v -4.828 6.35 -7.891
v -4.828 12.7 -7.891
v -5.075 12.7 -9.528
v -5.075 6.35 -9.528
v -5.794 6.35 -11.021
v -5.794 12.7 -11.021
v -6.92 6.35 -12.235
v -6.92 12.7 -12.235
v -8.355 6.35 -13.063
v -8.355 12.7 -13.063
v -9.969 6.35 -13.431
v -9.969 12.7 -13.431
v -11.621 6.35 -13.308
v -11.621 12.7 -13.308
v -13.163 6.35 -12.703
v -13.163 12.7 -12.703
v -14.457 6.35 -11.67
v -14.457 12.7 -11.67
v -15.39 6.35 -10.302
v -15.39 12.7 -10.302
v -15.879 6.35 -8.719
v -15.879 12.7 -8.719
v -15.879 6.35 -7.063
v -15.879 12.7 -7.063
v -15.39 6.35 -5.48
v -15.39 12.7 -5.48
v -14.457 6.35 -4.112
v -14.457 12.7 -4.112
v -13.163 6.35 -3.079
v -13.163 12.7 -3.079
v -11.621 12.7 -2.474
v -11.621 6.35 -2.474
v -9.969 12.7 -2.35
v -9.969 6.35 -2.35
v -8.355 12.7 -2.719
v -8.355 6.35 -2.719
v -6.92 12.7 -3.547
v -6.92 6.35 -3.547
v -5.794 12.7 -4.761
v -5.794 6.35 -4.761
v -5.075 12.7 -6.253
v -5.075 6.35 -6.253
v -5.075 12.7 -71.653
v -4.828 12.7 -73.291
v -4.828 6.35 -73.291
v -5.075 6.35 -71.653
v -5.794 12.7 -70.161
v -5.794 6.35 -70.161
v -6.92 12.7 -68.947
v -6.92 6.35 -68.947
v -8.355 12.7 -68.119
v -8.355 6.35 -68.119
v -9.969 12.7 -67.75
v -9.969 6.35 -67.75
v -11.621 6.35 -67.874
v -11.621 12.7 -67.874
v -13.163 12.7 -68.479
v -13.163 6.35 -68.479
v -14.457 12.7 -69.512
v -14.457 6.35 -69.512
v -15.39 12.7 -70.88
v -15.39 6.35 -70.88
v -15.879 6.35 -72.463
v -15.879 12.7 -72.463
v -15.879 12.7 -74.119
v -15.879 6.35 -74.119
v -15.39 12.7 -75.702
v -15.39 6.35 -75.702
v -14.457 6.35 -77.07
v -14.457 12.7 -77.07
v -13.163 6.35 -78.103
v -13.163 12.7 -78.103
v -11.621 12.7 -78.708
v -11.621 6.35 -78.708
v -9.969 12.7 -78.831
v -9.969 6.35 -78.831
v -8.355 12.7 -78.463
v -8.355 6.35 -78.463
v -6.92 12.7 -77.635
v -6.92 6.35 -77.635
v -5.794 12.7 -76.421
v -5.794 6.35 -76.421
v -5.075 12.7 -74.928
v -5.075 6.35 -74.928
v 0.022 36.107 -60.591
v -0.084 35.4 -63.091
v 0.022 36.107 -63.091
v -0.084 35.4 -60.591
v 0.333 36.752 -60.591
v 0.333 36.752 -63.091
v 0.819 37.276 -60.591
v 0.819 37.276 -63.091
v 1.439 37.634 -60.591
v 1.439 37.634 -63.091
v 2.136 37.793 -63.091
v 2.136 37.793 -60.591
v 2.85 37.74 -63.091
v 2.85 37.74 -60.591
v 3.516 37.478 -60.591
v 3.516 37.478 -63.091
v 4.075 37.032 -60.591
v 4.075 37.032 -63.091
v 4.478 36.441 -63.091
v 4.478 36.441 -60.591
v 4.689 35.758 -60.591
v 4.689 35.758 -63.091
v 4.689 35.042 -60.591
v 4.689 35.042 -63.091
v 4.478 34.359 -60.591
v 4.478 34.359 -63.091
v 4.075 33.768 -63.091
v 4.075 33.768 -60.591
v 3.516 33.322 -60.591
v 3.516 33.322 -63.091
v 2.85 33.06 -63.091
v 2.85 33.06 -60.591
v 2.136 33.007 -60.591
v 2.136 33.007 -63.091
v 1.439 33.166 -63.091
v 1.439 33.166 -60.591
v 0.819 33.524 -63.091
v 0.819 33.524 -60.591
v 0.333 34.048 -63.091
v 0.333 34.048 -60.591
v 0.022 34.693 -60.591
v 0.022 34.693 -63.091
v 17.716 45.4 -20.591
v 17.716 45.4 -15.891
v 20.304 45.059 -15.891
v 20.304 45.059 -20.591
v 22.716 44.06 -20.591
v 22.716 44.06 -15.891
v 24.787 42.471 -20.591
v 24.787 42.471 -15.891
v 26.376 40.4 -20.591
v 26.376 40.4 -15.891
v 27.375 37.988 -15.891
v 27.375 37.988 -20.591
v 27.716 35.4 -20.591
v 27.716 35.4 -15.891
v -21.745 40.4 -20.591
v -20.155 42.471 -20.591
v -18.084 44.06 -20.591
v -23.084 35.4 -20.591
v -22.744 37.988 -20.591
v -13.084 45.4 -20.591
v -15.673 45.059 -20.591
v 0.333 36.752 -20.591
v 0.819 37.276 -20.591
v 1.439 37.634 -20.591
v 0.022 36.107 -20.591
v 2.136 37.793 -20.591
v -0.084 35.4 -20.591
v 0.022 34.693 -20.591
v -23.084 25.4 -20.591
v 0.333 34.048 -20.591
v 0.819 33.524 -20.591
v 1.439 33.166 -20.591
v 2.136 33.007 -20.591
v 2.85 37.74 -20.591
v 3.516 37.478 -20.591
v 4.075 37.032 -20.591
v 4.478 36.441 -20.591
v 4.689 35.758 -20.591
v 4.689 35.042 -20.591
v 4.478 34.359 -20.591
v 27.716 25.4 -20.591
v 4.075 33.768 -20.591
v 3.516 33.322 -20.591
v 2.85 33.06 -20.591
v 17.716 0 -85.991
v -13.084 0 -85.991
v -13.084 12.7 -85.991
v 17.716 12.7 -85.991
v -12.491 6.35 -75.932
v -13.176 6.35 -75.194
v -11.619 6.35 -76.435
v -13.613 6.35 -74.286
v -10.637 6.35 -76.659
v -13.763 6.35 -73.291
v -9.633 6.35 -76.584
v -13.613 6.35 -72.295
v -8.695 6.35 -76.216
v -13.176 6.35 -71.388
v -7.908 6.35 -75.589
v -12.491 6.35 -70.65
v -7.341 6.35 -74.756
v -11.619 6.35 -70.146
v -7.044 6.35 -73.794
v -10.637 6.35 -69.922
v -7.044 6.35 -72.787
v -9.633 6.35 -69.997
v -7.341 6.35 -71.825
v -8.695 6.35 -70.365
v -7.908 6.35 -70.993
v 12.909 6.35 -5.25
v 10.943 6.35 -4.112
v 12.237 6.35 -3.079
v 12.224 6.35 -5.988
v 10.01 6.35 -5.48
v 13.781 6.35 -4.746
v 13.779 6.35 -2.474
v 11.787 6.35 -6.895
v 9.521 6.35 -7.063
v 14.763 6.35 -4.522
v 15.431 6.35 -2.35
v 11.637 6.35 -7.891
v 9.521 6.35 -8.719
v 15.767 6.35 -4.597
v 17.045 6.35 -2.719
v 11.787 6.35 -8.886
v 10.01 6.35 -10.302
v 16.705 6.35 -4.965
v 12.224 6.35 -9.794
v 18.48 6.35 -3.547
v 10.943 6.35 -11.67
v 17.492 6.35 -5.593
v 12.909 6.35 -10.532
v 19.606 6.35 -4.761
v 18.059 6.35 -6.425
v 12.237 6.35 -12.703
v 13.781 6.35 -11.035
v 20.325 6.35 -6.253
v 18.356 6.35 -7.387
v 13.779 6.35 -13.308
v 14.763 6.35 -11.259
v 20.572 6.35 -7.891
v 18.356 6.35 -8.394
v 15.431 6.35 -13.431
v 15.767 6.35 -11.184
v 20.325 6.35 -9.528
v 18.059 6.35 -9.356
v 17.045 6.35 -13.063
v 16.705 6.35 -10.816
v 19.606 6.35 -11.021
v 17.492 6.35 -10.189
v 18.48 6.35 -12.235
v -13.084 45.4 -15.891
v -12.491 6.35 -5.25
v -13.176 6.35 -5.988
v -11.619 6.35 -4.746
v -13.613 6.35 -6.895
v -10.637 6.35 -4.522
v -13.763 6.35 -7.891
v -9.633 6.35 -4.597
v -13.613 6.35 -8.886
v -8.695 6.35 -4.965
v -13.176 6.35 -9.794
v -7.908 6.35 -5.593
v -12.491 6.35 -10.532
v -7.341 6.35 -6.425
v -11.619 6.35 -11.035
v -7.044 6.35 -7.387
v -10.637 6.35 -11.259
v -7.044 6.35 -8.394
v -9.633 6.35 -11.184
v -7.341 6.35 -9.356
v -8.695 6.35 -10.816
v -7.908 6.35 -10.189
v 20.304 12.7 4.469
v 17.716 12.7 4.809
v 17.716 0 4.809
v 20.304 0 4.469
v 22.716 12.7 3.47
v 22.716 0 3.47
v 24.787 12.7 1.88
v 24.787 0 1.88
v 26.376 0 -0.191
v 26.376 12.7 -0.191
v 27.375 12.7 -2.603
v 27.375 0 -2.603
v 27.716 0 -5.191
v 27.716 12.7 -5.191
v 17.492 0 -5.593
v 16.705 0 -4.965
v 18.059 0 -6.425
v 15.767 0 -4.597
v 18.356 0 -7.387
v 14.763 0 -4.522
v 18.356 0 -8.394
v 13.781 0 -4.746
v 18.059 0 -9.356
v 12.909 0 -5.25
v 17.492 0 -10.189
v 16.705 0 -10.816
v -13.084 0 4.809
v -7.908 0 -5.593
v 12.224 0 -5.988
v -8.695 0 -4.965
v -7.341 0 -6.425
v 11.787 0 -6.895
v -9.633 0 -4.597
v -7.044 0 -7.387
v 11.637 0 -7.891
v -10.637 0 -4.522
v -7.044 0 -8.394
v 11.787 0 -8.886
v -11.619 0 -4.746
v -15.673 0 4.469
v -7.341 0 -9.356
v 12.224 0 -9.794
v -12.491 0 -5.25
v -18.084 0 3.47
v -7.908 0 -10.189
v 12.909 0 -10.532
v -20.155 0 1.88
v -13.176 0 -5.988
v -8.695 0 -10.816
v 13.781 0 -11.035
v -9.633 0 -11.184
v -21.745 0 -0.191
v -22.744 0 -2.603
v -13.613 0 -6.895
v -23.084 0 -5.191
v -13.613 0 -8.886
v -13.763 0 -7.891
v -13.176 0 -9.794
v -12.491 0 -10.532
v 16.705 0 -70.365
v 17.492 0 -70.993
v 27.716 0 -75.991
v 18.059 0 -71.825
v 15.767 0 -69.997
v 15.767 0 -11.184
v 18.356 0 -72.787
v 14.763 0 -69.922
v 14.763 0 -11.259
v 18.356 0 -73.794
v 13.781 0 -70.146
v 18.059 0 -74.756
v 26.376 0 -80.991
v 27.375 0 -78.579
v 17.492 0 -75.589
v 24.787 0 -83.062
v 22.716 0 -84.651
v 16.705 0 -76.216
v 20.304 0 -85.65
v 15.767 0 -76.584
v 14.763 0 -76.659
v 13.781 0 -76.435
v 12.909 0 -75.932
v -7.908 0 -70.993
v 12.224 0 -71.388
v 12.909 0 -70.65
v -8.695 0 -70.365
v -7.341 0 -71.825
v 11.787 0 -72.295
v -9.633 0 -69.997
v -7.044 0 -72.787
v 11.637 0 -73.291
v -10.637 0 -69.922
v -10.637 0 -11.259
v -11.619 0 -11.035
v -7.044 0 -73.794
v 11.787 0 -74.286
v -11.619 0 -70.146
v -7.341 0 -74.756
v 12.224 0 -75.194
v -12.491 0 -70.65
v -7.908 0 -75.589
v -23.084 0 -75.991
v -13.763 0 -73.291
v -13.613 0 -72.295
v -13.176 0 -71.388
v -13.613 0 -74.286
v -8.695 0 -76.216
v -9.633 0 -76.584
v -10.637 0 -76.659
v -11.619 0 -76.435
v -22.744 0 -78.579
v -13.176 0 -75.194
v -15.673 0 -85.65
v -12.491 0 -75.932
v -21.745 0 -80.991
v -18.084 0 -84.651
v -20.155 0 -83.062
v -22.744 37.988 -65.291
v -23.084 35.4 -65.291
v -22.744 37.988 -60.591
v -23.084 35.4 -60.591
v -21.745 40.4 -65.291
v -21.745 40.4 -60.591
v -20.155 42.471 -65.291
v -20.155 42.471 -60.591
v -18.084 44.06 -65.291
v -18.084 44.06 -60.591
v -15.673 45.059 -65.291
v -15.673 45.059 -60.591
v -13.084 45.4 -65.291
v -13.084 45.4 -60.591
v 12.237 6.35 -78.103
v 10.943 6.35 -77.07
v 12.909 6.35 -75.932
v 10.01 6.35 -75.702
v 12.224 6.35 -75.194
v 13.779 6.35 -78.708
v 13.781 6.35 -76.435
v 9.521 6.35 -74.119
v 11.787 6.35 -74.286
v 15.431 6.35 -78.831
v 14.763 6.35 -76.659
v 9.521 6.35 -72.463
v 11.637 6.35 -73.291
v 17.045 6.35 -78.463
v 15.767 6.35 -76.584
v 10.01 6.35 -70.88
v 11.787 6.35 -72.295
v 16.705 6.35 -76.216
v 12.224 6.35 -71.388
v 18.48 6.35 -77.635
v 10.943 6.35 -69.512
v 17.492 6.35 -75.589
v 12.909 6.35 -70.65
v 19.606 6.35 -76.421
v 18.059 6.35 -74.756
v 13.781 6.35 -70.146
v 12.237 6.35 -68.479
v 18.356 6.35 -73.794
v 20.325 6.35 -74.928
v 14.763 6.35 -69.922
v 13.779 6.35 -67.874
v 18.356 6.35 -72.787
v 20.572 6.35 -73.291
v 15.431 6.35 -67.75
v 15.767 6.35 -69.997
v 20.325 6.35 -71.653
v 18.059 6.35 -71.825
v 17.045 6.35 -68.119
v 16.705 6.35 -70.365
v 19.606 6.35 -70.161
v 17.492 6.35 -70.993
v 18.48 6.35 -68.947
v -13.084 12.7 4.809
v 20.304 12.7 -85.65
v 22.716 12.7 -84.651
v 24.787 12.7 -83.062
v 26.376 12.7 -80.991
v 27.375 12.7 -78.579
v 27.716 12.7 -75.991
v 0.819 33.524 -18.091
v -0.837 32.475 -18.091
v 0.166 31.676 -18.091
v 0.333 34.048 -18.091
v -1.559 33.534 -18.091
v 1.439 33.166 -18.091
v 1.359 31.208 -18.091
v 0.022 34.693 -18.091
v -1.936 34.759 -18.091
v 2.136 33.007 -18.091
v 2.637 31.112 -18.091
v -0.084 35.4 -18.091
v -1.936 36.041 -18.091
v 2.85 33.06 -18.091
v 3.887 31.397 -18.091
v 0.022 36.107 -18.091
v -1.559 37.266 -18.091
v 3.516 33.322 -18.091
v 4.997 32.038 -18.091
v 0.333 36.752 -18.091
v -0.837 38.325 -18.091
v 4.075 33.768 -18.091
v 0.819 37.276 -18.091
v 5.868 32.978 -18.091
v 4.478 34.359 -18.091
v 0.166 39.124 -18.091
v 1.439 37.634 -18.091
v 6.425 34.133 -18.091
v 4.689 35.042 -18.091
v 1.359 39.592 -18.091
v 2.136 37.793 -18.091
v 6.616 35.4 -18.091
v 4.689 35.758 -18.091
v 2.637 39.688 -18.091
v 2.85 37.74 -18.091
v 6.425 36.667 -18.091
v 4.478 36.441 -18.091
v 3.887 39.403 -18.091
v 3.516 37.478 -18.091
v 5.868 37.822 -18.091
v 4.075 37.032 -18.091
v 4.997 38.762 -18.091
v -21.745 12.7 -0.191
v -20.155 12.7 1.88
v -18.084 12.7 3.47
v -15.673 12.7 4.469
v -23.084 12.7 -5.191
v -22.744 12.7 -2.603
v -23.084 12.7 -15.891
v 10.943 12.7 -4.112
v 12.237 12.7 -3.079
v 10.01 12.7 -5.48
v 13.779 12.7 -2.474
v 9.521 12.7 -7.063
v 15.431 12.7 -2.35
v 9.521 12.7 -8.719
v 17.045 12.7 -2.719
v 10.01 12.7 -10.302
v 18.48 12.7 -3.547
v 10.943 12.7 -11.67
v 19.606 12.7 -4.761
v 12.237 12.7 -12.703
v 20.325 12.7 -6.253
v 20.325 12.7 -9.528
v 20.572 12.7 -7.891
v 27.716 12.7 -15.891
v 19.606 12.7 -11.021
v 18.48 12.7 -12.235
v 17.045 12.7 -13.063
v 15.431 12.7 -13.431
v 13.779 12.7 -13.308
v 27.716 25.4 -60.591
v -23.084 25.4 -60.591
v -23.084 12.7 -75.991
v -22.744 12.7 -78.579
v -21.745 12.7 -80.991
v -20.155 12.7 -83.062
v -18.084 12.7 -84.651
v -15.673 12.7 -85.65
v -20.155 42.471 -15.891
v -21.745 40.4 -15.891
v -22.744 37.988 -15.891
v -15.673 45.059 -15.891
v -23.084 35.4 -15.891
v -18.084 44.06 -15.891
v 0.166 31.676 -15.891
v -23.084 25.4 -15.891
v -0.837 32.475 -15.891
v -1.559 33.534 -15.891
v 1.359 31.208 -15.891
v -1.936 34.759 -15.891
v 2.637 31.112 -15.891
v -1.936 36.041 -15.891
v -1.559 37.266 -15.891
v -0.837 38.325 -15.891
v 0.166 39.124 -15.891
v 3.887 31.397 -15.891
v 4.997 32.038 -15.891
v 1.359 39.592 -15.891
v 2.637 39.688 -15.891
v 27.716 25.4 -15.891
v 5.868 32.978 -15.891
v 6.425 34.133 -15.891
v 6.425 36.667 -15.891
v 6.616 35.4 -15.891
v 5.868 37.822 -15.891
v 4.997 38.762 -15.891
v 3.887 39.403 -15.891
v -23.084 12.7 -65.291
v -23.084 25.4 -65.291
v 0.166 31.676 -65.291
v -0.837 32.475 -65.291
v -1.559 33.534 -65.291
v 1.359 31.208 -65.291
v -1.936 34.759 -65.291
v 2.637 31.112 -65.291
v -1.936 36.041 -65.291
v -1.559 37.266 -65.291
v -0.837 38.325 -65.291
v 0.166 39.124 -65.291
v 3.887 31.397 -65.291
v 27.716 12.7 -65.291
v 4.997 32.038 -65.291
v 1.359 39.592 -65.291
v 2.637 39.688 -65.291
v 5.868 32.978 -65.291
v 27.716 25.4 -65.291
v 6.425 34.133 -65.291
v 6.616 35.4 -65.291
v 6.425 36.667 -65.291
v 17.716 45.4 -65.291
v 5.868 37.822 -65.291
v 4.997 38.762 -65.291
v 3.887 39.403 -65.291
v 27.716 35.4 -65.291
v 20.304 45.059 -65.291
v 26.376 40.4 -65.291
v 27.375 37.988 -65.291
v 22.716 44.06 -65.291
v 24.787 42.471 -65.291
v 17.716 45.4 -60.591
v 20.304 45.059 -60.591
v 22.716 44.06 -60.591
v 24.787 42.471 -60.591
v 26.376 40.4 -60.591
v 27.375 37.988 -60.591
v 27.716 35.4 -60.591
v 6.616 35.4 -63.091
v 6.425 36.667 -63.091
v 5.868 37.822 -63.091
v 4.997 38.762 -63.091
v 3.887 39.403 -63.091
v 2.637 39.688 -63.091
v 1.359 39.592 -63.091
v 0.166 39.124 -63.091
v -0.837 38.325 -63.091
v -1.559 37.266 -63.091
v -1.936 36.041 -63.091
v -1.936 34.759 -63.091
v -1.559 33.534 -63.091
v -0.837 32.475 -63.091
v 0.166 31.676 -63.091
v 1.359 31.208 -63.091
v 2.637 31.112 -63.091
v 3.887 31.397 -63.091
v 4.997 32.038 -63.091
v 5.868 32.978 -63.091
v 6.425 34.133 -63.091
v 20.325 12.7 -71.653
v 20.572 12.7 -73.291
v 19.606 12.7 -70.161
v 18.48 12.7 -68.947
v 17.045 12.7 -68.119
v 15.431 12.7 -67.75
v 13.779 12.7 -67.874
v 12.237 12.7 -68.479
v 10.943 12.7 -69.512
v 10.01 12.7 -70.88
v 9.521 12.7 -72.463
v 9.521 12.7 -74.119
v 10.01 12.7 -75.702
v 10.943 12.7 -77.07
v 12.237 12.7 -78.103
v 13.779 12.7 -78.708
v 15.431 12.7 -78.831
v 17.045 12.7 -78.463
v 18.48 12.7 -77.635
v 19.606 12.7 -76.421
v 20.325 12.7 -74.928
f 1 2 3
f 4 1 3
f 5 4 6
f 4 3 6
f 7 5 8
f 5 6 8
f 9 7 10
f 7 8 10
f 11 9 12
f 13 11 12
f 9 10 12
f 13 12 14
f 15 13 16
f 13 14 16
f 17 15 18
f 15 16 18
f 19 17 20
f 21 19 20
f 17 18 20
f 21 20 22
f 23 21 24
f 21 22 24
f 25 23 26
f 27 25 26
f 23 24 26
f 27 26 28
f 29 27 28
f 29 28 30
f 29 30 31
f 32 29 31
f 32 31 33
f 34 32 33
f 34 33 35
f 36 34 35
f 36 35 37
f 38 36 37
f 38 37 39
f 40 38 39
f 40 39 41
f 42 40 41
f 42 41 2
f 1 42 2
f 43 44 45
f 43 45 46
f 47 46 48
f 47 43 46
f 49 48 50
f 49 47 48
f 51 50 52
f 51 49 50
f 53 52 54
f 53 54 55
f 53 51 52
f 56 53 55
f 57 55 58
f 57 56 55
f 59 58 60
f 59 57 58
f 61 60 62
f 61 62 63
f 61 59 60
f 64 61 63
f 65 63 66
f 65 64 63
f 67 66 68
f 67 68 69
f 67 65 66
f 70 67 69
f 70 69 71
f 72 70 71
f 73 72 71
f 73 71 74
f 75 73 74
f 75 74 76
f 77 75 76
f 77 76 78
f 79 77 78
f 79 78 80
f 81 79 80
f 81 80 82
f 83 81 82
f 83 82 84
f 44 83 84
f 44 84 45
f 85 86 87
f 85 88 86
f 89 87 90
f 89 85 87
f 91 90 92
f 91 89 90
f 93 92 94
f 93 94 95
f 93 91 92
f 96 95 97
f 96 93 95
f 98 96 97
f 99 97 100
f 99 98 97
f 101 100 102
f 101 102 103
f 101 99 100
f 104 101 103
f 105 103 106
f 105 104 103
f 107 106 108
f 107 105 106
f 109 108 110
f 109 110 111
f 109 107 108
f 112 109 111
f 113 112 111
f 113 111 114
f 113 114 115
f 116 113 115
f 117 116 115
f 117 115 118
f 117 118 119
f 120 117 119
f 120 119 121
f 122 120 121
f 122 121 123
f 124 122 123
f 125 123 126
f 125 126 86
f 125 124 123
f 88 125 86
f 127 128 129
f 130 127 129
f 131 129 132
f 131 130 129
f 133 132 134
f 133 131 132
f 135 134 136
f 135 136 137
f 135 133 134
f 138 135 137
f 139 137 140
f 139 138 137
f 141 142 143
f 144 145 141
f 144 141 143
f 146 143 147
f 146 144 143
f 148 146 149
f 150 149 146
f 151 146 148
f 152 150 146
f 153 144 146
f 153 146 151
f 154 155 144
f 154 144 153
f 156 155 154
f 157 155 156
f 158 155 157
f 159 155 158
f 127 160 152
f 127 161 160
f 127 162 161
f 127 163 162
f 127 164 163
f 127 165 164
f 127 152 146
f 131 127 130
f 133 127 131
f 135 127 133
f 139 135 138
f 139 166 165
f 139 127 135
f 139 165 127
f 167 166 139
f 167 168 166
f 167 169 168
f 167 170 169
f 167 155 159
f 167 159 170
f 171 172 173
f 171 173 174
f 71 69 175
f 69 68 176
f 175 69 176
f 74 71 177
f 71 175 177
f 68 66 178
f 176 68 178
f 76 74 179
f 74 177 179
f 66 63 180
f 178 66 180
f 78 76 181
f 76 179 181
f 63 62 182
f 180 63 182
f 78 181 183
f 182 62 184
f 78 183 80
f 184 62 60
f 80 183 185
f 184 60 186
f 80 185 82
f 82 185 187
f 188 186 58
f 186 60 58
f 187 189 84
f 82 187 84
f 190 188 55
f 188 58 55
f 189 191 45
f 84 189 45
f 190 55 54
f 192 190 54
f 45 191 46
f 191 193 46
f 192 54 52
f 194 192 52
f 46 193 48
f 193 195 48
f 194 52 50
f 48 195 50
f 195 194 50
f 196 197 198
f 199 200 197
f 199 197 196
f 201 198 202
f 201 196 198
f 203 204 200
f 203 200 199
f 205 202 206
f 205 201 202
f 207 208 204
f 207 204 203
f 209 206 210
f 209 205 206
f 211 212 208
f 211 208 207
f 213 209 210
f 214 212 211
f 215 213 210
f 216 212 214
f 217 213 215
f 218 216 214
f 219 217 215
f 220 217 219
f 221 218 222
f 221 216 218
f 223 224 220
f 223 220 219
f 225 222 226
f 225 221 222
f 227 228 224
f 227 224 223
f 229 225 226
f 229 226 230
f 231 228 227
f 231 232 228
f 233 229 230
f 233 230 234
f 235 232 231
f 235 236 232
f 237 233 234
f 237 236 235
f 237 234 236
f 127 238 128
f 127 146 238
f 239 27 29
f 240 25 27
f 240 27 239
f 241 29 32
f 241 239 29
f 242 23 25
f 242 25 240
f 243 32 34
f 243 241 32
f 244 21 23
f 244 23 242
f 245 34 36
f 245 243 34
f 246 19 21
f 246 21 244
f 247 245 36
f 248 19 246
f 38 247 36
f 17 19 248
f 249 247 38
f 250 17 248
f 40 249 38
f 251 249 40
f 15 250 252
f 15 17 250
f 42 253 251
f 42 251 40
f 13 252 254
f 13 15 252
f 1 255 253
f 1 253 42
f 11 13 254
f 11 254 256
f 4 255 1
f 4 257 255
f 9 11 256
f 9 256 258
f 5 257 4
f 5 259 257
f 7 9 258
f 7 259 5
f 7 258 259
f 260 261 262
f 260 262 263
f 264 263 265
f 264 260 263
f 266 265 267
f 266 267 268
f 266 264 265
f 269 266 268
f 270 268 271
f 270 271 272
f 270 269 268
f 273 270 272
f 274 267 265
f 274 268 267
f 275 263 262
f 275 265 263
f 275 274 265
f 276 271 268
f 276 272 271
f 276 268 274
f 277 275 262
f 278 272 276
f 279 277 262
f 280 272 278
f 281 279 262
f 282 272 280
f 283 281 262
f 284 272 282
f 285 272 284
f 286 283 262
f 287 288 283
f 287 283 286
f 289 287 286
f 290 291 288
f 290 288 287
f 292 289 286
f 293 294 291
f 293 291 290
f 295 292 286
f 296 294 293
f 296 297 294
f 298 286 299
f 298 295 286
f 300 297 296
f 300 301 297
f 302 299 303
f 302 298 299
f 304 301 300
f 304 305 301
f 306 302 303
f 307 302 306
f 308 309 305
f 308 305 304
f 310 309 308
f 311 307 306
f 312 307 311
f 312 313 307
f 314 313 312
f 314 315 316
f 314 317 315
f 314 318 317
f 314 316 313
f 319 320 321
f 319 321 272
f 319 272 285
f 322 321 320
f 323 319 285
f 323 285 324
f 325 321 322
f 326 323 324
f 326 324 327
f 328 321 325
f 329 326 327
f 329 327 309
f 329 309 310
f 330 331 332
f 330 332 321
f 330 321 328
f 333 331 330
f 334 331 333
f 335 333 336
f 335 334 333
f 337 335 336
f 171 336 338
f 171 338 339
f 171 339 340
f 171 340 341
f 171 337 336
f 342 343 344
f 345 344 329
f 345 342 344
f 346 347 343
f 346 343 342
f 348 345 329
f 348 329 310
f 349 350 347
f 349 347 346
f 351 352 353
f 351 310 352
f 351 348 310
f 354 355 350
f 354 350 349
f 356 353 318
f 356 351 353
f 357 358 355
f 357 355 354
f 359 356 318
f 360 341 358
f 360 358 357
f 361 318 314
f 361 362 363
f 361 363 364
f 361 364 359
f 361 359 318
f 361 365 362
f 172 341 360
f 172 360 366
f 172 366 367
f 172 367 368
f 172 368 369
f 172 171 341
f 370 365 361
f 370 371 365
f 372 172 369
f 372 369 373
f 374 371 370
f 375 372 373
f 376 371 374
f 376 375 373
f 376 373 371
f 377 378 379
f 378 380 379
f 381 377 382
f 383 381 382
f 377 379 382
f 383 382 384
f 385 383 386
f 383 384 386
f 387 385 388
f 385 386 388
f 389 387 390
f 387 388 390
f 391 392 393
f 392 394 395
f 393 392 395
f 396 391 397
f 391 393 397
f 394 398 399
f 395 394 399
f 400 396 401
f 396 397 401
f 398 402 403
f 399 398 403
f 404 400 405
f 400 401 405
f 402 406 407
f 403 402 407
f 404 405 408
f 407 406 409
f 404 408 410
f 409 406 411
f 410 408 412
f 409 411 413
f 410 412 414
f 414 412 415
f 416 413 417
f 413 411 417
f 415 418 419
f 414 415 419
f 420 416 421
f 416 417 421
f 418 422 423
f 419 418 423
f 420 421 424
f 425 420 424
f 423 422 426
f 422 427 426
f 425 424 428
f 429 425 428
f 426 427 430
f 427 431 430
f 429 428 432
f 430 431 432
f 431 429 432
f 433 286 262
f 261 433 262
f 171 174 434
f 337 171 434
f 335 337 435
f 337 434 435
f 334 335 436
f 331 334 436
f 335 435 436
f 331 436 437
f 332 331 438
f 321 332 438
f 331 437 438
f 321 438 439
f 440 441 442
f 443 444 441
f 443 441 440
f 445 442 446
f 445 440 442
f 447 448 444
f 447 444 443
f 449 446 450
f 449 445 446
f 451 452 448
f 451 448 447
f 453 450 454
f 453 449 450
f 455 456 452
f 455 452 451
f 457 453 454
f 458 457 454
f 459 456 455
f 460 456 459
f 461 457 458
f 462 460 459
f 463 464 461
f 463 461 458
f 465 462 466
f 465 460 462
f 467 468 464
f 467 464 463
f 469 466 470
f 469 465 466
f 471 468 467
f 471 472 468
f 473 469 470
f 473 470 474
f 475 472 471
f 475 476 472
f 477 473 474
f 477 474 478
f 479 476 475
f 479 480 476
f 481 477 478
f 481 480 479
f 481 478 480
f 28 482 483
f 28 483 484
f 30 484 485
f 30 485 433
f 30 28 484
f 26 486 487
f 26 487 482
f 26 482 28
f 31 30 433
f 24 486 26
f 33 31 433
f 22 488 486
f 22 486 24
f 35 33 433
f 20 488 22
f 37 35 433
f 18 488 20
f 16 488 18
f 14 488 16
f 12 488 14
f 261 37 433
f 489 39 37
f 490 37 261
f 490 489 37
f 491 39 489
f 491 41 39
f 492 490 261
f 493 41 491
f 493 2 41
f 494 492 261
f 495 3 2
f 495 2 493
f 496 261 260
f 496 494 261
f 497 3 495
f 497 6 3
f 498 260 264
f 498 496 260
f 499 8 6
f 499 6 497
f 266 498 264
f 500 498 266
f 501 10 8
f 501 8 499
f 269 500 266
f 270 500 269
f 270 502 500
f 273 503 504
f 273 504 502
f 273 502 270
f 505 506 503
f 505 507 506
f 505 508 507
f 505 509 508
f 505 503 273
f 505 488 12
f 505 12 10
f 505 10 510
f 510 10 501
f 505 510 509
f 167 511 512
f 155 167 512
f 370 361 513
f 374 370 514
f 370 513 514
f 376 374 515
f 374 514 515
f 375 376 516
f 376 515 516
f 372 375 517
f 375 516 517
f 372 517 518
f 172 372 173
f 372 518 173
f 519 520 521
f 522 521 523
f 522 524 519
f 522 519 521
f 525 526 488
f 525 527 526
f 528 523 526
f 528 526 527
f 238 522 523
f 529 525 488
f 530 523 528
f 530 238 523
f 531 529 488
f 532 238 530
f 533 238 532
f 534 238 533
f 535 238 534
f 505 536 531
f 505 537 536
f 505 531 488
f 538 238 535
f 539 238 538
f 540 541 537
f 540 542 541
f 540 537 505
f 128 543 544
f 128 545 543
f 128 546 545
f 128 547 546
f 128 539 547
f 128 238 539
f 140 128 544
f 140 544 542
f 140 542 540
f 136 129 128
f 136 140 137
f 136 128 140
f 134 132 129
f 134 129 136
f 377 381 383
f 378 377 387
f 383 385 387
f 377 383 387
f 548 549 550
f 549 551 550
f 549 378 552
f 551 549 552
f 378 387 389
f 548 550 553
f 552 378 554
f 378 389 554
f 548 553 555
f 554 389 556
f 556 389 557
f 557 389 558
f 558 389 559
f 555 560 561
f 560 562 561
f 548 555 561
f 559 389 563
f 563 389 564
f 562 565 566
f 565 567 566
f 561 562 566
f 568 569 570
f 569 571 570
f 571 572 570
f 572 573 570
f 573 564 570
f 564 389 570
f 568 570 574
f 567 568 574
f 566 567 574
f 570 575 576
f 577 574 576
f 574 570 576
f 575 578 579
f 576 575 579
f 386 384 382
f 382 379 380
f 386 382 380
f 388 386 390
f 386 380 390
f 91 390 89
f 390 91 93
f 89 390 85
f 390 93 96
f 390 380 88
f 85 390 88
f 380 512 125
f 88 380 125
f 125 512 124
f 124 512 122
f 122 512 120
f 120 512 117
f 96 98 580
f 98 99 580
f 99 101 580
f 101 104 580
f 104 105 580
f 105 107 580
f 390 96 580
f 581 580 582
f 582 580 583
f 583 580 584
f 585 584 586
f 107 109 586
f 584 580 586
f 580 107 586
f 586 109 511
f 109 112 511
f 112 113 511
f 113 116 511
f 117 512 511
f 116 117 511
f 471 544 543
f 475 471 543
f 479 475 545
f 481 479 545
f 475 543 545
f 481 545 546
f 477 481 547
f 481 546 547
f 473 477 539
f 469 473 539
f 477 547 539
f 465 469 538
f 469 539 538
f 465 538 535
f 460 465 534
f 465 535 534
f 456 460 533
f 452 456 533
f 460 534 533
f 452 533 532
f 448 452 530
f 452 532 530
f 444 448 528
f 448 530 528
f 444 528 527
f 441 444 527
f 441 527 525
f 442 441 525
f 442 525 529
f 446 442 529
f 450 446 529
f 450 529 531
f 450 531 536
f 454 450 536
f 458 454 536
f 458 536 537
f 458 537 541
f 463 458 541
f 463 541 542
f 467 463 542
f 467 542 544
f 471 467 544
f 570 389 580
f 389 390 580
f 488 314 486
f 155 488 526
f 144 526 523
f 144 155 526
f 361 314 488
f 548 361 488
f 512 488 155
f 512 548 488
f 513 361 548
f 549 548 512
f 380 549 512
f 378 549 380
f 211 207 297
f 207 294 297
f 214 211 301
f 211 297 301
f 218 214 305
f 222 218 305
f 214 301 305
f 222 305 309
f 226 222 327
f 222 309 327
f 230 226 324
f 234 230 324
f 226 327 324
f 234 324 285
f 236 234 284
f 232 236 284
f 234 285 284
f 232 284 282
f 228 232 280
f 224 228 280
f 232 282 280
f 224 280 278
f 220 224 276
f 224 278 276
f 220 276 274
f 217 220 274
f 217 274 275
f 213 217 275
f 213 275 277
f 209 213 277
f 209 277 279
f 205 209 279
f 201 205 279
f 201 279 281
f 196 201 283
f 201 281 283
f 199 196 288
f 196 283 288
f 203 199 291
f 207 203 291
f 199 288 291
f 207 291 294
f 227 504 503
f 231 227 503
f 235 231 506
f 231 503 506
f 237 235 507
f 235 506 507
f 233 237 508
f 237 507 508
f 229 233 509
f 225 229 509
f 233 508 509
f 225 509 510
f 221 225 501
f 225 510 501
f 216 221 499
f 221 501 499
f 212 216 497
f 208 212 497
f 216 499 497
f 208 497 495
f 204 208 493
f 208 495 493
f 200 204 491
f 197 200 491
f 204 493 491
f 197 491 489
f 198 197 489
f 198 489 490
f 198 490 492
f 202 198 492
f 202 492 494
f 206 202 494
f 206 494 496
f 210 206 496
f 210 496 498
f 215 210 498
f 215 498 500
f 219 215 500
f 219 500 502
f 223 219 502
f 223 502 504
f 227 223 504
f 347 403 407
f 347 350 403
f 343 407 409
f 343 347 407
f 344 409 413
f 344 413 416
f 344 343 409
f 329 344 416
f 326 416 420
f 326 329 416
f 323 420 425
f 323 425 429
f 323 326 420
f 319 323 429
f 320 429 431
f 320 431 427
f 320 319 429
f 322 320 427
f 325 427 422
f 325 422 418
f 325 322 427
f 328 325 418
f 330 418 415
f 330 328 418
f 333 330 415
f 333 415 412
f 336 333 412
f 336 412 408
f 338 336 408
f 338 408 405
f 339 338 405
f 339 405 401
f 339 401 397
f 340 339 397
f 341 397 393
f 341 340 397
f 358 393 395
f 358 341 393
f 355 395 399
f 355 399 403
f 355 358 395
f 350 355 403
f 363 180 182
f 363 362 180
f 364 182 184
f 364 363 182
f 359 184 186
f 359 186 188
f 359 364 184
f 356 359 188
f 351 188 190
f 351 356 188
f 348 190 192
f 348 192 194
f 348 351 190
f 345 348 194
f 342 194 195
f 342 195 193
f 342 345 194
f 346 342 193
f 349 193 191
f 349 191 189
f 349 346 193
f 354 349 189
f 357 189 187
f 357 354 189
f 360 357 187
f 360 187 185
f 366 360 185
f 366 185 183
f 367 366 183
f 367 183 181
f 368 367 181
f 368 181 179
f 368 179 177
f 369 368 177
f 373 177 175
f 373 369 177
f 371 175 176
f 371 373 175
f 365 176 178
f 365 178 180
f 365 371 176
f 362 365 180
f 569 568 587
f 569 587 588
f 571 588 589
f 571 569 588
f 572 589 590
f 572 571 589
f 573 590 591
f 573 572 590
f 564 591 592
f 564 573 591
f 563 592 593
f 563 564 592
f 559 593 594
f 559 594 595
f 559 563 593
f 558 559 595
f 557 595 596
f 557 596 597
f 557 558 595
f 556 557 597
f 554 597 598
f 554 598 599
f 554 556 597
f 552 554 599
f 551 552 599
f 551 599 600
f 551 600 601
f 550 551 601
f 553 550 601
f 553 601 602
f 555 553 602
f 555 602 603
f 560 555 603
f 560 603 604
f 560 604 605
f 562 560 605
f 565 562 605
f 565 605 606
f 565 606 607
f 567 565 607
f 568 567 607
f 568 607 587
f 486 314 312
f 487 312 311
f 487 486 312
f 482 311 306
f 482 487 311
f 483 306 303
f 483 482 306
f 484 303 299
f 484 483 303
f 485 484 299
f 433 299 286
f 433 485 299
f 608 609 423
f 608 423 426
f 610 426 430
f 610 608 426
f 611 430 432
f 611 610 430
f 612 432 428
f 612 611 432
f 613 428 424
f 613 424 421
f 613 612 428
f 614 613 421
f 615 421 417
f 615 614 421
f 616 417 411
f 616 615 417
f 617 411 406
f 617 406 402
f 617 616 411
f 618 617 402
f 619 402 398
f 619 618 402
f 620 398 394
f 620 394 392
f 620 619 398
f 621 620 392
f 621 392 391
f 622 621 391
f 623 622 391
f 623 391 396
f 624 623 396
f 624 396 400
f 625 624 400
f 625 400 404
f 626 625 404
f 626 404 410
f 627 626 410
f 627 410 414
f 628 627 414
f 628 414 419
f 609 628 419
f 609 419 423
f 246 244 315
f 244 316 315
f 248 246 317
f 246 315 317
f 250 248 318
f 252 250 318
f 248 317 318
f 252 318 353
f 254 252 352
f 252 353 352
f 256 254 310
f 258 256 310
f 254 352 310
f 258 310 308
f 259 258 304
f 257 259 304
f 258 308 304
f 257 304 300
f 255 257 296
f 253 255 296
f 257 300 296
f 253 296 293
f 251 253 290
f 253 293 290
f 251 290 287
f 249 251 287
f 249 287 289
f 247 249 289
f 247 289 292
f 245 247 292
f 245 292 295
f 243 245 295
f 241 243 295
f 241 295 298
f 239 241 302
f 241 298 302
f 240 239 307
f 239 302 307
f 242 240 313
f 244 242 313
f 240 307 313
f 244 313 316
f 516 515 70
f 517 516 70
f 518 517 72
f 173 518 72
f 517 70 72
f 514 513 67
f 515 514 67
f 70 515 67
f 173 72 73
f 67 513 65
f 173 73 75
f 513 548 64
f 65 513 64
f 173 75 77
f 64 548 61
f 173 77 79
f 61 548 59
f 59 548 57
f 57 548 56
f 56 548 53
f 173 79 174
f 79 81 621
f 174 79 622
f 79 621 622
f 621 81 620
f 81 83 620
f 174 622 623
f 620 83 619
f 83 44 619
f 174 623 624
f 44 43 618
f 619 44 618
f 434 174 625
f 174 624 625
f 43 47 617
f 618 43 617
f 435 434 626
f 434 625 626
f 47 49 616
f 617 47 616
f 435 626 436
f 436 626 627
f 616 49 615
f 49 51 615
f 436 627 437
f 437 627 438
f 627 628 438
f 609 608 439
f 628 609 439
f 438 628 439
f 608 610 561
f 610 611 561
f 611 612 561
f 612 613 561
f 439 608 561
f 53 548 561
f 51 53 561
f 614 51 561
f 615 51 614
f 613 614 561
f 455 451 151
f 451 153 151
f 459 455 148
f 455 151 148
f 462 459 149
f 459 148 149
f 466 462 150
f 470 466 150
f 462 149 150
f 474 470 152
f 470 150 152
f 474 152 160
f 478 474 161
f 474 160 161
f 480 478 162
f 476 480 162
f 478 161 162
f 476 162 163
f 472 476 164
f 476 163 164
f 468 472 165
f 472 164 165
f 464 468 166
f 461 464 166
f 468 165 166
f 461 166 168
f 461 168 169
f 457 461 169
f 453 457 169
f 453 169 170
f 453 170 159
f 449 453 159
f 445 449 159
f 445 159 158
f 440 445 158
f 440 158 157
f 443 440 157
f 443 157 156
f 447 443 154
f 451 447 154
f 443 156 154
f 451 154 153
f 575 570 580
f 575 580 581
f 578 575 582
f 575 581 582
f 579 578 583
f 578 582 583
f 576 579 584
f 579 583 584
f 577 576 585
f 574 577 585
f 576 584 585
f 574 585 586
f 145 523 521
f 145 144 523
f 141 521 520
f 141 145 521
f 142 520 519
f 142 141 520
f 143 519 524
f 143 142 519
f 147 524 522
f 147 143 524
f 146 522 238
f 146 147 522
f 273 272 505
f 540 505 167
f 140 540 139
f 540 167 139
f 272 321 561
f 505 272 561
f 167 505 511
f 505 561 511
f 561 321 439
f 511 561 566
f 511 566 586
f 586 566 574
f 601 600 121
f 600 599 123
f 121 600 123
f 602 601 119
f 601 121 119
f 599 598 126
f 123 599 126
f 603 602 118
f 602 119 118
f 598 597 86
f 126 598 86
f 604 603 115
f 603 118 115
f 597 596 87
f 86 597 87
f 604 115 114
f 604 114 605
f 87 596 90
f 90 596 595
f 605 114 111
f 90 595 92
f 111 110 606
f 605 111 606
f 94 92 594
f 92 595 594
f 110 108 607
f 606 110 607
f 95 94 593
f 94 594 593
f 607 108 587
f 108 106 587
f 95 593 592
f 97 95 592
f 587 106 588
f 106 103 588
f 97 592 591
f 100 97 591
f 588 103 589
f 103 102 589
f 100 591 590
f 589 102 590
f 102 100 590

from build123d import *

# Parameters (mm, degrees)
SKETCH1_W                                        = 50.8
SKETCH1_H                                        = 25.4
BOSS_EXTRUDE1_DEPTH                              = 25.4
CBORE_FOR_1_4_SOCKET_HEAD_CAP_SCREW1_D           = 6.7564
CBORE_FOR_1_4_SOCKET_HEAD_CAP_SCREW1_CBORE_D     = 11.1125
CBORE_FOR_1_4_SOCKET_HEAD_CAP_SCREW1_CBORE_DEPTH = 19.05
SKETCH6_W                                        = 50.8
SKETCH6_H                                        = 4.7
BOSS_EXTRUDE2_DEPTH                              = 20
CBORE_FOR_M4_SBHCS1_D                            = 4.8
CBORE_FOR_M4_SBHCS1_CBORE_D                      = 8.6
CBORE_FOR_M4_SBHCS1_CBORE_DEPTH                  = 2.2
FILLET1_R                                        = 10
SKETCH15_W                                       = 50.8
SKETCH15_H                                       = 25.4
BOSS_EXTRUDE3_DEPTH                              = 20
SKETCH16_W                                       = 51.113320751
SKETCH16_H                                       = 27.993322013
CUT_EXTRUDE2_DEPTH                               = 12.7


with BuildPart() as part:
    # Sketch1 → Boss-Extrude1 (new body)
    with BuildSketch(Plane(origin=(0, 0, 0), x_dir=(1, 0, 0), z_dir=(0, 1, 0))):
        with Locations((2.315568022, 7.890743338)):
            Rectangle(SKETCH1_W, SKETCH1_H)
    extrude(amount=BOSS_EXTRUDE1_DEPTH)

    # CBORE for 1/4 Socket Head Cap Screw1 (through all)
    with Locations(Plane(origin=(0, 25.4, 0), x_dir=(1, 0, 0), z_dir=(0, 1, 0))):
        with Locations((-10.384431978, 7.890743338), (15.015568022, 7.890743338)):
            CounterBoreHole(CBORE_FOR_1_4_SOCKET_HEAD_CAP_SCREW1_D / 2, CBORE_FOR_1_4_SOCKET_HEAD_CAP_SCREW1_CBORE_D / 2, CBORE_FOR_1_4_SOCKET_HEAD_CAP_SCREW1_CBORE_DEPTH)

    # Sketch6 → Boss-Extrude2 (add)
    with BuildSketch(Plane(origin=(0, 25.4, 0), x_dir=(1, 0, 0), z_dir=(0, 1, 0))):
        with Locations((2.315568022, 18.240743338)):
            Rectangle(SKETCH6_W, SKETCH6_H)
    extrude(amount=BOSS_EXTRUDE2_DEPTH)

    # CBORE for M4 SBHCS1 (through all)
    with Locations(Plane.XY.offset(-15.890743338)):
        with Locations((2.315568022, 35.4)):
            CounterBoreHole(CBORE_FOR_M4_SBHCS1_D / 2, CBORE_FOR_M4_SBHCS1_CBORE_D / 2, CBORE_FOR_M4_SBHCS1_CBORE_DEPTH)

    # Fillet1
    fillet1_edges = [part.edges().sort_by_distance(p)[0] for p in [
        (27.715568022, 45.4, -18.240743338),
        (-23.084431978, 45.4, -18.240743338),
        (27.715568022, 12.7, 4.809256662),
        (-23.084431978, 12.7, 4.809256662),
    ]]
    fillet(fillet1_edges, radius=FILLET1_R)

    # Sketch15 → Boss-Extrude3 (add)
    with BuildSketch(Plane(origin=(0, 0, -20.590743338), x_dir=(-1, 0, 0), z_dir=(0, 0, -1))):
        with Locations((-2.315568022, 12.7)):
            Rectangle(SKETCH15_W, SKETCH15_H)
    extrude(amount=BOSS_EXTRUDE3_DEPTH)

    # Sketch16 → Cut-Extrude2 (cut)
    with BuildSketch(Plane(origin=(0, 25.4, 0), x_dir=(1, 0, 0), z_dir=(0, 1, 0))):
        with Locations((2.472228398, 1.894082332)):
            Rectangle(SKETCH16_W, SKETCH16_H)
    extrude(amount=-CUT_EXTRUDE2_DEPTH, mode=Mode.SUBTRACT)

    # Mirror1: part across plane


with BuildPart() as part_1:
    add(part.part)
    add(part.part.mirror(Plane(origin=(0, 0, -40.590743338), x_dir=(1, 0, 0), z_dir=(0, 0, -1))))


solid = part_1.part
